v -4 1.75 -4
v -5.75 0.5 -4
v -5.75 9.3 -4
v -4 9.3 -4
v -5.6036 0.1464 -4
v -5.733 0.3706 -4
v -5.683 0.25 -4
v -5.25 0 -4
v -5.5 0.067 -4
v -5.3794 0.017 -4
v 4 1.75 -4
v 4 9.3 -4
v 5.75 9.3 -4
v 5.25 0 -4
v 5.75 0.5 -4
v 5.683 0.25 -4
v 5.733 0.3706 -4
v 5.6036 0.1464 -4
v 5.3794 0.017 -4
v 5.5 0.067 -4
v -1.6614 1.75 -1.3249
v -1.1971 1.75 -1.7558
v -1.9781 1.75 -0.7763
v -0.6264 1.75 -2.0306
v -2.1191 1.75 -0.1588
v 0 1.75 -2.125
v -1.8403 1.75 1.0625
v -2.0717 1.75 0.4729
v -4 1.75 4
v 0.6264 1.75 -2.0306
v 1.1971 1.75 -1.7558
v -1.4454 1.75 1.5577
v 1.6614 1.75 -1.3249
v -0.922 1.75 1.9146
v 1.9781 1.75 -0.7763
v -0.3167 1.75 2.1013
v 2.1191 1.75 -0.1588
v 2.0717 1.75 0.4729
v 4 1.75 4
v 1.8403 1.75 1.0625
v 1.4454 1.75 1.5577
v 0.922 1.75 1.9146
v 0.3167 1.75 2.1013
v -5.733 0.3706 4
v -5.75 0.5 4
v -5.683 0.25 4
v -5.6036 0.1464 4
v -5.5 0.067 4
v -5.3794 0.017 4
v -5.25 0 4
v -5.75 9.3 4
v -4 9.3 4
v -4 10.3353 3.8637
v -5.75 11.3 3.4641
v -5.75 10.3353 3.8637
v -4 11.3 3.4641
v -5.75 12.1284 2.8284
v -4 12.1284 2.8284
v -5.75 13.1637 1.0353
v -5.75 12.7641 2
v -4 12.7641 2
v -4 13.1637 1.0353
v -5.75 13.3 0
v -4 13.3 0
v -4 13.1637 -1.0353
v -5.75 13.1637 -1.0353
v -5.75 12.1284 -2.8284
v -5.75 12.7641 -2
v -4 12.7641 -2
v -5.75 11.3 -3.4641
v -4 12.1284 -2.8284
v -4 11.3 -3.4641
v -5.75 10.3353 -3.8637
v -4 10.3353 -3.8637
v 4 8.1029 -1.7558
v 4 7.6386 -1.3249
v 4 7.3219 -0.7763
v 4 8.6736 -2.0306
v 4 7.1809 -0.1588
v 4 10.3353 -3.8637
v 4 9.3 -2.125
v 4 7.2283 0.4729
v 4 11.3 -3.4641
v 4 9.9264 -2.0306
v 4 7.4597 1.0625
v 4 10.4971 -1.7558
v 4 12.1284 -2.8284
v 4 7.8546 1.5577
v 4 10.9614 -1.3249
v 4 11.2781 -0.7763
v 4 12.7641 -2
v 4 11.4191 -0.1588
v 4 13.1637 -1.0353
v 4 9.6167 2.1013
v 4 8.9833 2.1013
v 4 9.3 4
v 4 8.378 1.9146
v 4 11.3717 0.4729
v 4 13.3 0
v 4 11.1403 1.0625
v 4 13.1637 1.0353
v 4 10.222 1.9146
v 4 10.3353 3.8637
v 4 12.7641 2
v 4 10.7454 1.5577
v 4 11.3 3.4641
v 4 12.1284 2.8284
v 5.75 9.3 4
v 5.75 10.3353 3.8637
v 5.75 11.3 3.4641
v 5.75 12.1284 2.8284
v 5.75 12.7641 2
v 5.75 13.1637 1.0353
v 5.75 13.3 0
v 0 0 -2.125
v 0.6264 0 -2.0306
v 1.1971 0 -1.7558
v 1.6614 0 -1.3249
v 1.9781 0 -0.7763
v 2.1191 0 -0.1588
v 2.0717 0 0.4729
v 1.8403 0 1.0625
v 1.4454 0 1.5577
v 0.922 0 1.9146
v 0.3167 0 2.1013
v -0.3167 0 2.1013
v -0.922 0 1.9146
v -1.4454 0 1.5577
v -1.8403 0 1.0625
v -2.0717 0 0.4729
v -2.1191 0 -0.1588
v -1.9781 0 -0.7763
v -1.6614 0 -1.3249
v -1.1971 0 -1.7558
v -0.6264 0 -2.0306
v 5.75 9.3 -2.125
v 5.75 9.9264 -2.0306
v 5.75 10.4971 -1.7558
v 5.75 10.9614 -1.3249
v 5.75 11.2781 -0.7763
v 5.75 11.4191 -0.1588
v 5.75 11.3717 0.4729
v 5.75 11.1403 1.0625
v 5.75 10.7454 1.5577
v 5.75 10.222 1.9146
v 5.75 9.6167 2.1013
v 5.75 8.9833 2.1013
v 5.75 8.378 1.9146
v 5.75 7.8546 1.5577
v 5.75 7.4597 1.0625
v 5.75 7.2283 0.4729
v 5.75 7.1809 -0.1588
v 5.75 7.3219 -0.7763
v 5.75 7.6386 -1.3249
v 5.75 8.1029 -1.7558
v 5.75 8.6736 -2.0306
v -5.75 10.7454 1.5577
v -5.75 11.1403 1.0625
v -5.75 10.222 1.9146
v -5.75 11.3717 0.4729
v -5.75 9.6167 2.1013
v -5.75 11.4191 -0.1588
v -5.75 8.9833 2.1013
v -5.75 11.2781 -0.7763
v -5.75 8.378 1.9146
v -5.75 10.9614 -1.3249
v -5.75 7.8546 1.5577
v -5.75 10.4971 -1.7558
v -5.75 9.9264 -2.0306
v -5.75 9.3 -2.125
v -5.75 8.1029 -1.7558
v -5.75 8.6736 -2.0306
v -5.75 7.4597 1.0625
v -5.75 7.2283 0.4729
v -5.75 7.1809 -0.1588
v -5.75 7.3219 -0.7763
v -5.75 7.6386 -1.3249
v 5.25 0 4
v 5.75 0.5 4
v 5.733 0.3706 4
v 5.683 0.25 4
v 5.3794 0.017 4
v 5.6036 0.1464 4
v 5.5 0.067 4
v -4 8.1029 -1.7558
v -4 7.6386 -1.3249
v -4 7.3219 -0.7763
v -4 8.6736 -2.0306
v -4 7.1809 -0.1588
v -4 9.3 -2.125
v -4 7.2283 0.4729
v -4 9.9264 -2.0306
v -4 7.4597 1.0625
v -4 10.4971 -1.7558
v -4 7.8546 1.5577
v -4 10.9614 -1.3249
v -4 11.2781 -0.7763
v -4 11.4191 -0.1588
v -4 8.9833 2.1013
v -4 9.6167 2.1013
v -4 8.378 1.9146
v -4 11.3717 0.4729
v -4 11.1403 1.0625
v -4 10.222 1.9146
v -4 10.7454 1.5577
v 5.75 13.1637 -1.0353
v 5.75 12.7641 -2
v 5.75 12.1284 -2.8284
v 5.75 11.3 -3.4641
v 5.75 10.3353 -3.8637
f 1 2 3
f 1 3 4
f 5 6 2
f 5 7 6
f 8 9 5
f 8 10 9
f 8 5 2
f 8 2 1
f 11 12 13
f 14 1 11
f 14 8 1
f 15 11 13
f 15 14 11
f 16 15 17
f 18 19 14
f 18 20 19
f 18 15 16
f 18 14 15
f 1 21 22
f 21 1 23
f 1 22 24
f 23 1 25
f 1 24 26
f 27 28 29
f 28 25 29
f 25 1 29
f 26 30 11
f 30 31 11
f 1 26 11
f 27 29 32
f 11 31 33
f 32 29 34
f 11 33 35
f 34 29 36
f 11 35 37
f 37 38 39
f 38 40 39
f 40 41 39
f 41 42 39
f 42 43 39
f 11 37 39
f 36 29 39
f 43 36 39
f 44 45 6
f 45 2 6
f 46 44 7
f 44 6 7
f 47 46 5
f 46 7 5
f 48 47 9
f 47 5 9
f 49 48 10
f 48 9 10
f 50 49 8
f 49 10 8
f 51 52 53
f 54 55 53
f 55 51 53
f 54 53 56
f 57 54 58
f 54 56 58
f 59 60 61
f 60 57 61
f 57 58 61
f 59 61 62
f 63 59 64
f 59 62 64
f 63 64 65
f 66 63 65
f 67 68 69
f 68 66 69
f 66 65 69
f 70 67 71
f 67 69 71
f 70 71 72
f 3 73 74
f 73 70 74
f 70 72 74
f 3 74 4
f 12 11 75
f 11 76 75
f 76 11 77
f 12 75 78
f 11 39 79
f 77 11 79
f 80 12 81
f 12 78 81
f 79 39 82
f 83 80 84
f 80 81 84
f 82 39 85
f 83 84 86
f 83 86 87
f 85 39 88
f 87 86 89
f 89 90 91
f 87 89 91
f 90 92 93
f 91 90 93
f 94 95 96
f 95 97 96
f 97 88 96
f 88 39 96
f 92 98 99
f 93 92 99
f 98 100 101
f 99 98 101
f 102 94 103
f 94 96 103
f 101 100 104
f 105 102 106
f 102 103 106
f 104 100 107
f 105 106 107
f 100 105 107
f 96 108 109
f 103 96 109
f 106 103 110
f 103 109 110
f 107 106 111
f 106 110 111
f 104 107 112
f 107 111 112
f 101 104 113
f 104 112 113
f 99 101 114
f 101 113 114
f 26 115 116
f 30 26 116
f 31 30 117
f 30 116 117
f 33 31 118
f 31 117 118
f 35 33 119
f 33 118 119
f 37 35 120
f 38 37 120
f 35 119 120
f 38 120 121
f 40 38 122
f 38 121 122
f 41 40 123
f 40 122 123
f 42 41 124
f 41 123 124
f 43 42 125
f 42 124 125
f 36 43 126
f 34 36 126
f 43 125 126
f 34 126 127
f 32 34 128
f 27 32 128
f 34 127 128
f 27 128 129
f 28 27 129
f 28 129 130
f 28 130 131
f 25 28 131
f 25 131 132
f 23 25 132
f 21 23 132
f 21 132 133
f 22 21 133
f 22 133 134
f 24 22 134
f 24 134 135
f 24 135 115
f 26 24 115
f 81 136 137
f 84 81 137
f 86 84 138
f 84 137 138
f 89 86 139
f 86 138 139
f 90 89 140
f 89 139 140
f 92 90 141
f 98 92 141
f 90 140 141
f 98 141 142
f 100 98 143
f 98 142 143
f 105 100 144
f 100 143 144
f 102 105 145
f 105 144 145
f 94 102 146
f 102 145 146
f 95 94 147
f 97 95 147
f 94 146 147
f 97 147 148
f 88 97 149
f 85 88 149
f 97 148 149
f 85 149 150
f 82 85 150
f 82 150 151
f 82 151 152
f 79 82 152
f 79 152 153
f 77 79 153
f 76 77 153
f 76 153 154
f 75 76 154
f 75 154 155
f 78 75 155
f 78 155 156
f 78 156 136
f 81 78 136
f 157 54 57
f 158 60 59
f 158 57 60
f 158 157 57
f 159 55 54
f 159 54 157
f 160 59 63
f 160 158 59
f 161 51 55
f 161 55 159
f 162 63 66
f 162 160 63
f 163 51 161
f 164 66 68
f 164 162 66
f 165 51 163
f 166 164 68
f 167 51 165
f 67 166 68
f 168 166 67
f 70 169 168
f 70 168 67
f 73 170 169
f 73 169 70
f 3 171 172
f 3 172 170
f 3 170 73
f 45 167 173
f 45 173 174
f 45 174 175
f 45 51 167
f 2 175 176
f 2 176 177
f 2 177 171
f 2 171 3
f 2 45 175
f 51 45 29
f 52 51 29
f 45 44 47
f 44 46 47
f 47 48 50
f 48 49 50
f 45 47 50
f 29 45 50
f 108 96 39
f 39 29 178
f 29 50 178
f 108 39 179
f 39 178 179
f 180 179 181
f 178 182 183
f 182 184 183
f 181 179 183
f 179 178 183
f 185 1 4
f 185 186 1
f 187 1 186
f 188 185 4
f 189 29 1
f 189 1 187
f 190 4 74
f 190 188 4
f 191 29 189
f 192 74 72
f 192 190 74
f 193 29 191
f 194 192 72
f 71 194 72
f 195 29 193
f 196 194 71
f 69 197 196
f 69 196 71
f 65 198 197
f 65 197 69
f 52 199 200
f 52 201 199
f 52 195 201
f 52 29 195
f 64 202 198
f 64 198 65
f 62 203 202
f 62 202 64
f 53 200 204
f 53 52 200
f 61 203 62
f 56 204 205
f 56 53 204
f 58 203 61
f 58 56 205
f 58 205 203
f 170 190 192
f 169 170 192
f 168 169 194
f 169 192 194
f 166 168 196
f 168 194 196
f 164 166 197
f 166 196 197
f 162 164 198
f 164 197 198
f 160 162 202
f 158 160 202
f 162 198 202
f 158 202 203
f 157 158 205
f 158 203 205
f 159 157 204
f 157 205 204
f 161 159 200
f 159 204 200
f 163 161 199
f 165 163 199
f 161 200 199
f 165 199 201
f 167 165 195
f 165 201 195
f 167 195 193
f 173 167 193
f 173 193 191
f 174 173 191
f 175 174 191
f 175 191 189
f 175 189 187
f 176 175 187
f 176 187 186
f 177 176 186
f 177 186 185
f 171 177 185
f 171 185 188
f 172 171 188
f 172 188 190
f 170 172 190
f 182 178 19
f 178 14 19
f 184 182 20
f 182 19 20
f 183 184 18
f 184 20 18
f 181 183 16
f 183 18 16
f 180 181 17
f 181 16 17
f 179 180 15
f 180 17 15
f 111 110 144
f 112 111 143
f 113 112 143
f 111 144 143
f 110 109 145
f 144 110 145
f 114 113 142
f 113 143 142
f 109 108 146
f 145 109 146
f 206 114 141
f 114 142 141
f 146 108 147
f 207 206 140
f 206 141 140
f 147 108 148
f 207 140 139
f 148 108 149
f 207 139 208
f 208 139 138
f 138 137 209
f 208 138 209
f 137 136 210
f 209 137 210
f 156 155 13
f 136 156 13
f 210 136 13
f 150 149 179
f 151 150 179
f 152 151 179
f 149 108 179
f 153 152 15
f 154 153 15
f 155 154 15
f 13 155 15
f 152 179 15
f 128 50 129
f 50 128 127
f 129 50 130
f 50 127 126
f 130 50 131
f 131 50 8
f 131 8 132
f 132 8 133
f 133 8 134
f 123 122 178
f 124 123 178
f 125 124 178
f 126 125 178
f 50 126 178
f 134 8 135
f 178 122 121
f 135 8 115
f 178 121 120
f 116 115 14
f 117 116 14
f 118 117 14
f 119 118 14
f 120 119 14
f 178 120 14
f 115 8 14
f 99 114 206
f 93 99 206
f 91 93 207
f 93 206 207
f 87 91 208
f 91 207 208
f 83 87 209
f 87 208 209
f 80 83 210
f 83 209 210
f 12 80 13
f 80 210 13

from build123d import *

# Parameters (mm, degrees)
SKETCH1_W           = 11.5
SKETCH1_H           = 8
BOSS_EXTRUDE1_DEPTH = 13.3
CUT_EXTRUDE1_REACH  = 20.032
SKETCH2_R           = 2.125
CUT_EXTRUDE2_REACH  = 20.032
CUT_EXTRUDE3_REACH  = 18.552
SKETCH4_W           = 8
SKETCH4_H           = 11.55
CUT_EXTRUDE4_REACH  = 17.032
SKETCH5_R           = 2.125
FILLET1_R           = 0.5


with BuildPart() as part:
    # Sketch1 → Boss-Extrude1 (new body)
    with BuildSketch(Plane(origin=(0, 0, 0), x_dir=(1, 0, 0), z_dir=(0, 1, 0))):
        Rectangle(SKETCH1_W, SKETCH1_H)
    extrude(amount=BOSS_EXTRUDE1_DEPTH)

    # Sketch2 → Cut-Extrude1 (cut, up to next)
    with BuildSketch(Plane(origin=(5.75, 0, 0), x_dir=(0, 0, -1), z_dir=(1, 0, 0)), mode=Mode.PRIVATE) as cut_extrude1_sk1:
        with Locations((0, 9.3)):
            Circle(SKETCH2_R)
    cut_extrude1_tool1 = extrude(cut_extrude1_sk1.sketch, amount=-CUT_EXTRUDE1_REACH, mode=Mode.PRIVATE) & part.part
    add(cut_extrude1_tool1.solids().sort_by_distance((5.75, 9.3, 0))[0], mode=Mode.SUBTRACT)

    # Sketch3 → Cut-Extrude2 (cut, up to next)
    with BuildSketch(Plane(origin=(5.75, 0, 0), x_dir=(0, 0, -1), z_dir=(1, 0, 0)), mode=Mode.PRIVATE) as cut_extrude2_sk1:
        with BuildLine():
            Line((4, 13.3), (0, 13.3))
            ThreePointArc((0, 13.3), (2.828427125, 12.128427125), (4, 9.3))
            Line((4, 9.3), (4, 13.3))
        make_face()
    cut_extrude2_tool1 = extrude(cut_extrude2_sk1.sketch, amount=-CUT_EXTRUDE2_REACH, mode=Mode.PRIVATE) & part.part
    # Sketch3 → Cut-Extrude2 (cut, up to next)
    with BuildSketch(Plane(origin=(5.75, 0, 0), x_dir=(0, 0, -1), z_dir=(1, 0, 0)), mode=Mode.PRIVATE) as cut_extrude2_sk2:
        with BuildLine():
            Line((0, 13.3), (-4, 13.3))
            Line((-4, 13.3), (-4, 9.3))
            ThreePointArc((-4, 9.3), (-2.828427125, 12.128427125), (0, 13.3))
        make_face()
    cut_extrude2_tool2 = extrude(cut_extrude2_sk2.sketch, amount=-CUT_EXTRUDE2_REACH, mode=Mode.PRIVATE) & part.part
    add(cut_extrude2_tool1.solids().sort_by_distance((5.75, 12.406528, -3.106528))[0], mode=Mode.SUBTRACT)
    add(cut_extrude2_tool2.solids().sort_by_distance((5.75, 12.406528, 3.106528))[0], mode=Mode.SUBTRACT)

    # Sketch4 → Cut-Extrude3 (cut, up to next)
    with BuildSketch(Plane.XY.offset(4), mode=Mode.PRIVATE) as cut_extrude3_sk1:
        with Locations((0, 7.525)):
            Rectangle(SKETCH4_W, SKETCH4_H)
    cut_extrude3_tool1 = extrude(cut_extrude3_sk1.sketch, amount=-CUT_EXTRUDE3_REACH, mode=Mode.PRIVATE) & part.part
    add(cut_extrude3_tool1.solids().sort_by_distance((0, 7.525, 4))[0], mode=Mode.SUBTRACT)

    # Sketch5 → Cut-Extrude4 (cut, up to next)
    with BuildSketch(Plane.XZ, mode=Mode.PRIVATE) as cut_extrude4_sk1:
        with Locations(Location((0, 0, 0), (0, 0, 270))):
            Circle(SKETCH5_R)
    cut_extrude4_tool1 = extrude(cut_extrude4_sk1.sketch, amount=-CUT_EXTRUDE4_REACH, mode=Mode.PRIVATE) & part.part
    add(cut_extrude4_tool1.solids().sort_by_distance((0, 0, 0))[0], mode=Mode.SUBTRACT)

    # Fillet1
    fillet1_edges = [part.edges().sort_by_distance(p)[0] for p in [
        (5.75, 0, 0),
        (-5.75, 0, 0),
    ]]
    fillet(fillet1_edges, radius=FILLET1_R)


solid = part.part
